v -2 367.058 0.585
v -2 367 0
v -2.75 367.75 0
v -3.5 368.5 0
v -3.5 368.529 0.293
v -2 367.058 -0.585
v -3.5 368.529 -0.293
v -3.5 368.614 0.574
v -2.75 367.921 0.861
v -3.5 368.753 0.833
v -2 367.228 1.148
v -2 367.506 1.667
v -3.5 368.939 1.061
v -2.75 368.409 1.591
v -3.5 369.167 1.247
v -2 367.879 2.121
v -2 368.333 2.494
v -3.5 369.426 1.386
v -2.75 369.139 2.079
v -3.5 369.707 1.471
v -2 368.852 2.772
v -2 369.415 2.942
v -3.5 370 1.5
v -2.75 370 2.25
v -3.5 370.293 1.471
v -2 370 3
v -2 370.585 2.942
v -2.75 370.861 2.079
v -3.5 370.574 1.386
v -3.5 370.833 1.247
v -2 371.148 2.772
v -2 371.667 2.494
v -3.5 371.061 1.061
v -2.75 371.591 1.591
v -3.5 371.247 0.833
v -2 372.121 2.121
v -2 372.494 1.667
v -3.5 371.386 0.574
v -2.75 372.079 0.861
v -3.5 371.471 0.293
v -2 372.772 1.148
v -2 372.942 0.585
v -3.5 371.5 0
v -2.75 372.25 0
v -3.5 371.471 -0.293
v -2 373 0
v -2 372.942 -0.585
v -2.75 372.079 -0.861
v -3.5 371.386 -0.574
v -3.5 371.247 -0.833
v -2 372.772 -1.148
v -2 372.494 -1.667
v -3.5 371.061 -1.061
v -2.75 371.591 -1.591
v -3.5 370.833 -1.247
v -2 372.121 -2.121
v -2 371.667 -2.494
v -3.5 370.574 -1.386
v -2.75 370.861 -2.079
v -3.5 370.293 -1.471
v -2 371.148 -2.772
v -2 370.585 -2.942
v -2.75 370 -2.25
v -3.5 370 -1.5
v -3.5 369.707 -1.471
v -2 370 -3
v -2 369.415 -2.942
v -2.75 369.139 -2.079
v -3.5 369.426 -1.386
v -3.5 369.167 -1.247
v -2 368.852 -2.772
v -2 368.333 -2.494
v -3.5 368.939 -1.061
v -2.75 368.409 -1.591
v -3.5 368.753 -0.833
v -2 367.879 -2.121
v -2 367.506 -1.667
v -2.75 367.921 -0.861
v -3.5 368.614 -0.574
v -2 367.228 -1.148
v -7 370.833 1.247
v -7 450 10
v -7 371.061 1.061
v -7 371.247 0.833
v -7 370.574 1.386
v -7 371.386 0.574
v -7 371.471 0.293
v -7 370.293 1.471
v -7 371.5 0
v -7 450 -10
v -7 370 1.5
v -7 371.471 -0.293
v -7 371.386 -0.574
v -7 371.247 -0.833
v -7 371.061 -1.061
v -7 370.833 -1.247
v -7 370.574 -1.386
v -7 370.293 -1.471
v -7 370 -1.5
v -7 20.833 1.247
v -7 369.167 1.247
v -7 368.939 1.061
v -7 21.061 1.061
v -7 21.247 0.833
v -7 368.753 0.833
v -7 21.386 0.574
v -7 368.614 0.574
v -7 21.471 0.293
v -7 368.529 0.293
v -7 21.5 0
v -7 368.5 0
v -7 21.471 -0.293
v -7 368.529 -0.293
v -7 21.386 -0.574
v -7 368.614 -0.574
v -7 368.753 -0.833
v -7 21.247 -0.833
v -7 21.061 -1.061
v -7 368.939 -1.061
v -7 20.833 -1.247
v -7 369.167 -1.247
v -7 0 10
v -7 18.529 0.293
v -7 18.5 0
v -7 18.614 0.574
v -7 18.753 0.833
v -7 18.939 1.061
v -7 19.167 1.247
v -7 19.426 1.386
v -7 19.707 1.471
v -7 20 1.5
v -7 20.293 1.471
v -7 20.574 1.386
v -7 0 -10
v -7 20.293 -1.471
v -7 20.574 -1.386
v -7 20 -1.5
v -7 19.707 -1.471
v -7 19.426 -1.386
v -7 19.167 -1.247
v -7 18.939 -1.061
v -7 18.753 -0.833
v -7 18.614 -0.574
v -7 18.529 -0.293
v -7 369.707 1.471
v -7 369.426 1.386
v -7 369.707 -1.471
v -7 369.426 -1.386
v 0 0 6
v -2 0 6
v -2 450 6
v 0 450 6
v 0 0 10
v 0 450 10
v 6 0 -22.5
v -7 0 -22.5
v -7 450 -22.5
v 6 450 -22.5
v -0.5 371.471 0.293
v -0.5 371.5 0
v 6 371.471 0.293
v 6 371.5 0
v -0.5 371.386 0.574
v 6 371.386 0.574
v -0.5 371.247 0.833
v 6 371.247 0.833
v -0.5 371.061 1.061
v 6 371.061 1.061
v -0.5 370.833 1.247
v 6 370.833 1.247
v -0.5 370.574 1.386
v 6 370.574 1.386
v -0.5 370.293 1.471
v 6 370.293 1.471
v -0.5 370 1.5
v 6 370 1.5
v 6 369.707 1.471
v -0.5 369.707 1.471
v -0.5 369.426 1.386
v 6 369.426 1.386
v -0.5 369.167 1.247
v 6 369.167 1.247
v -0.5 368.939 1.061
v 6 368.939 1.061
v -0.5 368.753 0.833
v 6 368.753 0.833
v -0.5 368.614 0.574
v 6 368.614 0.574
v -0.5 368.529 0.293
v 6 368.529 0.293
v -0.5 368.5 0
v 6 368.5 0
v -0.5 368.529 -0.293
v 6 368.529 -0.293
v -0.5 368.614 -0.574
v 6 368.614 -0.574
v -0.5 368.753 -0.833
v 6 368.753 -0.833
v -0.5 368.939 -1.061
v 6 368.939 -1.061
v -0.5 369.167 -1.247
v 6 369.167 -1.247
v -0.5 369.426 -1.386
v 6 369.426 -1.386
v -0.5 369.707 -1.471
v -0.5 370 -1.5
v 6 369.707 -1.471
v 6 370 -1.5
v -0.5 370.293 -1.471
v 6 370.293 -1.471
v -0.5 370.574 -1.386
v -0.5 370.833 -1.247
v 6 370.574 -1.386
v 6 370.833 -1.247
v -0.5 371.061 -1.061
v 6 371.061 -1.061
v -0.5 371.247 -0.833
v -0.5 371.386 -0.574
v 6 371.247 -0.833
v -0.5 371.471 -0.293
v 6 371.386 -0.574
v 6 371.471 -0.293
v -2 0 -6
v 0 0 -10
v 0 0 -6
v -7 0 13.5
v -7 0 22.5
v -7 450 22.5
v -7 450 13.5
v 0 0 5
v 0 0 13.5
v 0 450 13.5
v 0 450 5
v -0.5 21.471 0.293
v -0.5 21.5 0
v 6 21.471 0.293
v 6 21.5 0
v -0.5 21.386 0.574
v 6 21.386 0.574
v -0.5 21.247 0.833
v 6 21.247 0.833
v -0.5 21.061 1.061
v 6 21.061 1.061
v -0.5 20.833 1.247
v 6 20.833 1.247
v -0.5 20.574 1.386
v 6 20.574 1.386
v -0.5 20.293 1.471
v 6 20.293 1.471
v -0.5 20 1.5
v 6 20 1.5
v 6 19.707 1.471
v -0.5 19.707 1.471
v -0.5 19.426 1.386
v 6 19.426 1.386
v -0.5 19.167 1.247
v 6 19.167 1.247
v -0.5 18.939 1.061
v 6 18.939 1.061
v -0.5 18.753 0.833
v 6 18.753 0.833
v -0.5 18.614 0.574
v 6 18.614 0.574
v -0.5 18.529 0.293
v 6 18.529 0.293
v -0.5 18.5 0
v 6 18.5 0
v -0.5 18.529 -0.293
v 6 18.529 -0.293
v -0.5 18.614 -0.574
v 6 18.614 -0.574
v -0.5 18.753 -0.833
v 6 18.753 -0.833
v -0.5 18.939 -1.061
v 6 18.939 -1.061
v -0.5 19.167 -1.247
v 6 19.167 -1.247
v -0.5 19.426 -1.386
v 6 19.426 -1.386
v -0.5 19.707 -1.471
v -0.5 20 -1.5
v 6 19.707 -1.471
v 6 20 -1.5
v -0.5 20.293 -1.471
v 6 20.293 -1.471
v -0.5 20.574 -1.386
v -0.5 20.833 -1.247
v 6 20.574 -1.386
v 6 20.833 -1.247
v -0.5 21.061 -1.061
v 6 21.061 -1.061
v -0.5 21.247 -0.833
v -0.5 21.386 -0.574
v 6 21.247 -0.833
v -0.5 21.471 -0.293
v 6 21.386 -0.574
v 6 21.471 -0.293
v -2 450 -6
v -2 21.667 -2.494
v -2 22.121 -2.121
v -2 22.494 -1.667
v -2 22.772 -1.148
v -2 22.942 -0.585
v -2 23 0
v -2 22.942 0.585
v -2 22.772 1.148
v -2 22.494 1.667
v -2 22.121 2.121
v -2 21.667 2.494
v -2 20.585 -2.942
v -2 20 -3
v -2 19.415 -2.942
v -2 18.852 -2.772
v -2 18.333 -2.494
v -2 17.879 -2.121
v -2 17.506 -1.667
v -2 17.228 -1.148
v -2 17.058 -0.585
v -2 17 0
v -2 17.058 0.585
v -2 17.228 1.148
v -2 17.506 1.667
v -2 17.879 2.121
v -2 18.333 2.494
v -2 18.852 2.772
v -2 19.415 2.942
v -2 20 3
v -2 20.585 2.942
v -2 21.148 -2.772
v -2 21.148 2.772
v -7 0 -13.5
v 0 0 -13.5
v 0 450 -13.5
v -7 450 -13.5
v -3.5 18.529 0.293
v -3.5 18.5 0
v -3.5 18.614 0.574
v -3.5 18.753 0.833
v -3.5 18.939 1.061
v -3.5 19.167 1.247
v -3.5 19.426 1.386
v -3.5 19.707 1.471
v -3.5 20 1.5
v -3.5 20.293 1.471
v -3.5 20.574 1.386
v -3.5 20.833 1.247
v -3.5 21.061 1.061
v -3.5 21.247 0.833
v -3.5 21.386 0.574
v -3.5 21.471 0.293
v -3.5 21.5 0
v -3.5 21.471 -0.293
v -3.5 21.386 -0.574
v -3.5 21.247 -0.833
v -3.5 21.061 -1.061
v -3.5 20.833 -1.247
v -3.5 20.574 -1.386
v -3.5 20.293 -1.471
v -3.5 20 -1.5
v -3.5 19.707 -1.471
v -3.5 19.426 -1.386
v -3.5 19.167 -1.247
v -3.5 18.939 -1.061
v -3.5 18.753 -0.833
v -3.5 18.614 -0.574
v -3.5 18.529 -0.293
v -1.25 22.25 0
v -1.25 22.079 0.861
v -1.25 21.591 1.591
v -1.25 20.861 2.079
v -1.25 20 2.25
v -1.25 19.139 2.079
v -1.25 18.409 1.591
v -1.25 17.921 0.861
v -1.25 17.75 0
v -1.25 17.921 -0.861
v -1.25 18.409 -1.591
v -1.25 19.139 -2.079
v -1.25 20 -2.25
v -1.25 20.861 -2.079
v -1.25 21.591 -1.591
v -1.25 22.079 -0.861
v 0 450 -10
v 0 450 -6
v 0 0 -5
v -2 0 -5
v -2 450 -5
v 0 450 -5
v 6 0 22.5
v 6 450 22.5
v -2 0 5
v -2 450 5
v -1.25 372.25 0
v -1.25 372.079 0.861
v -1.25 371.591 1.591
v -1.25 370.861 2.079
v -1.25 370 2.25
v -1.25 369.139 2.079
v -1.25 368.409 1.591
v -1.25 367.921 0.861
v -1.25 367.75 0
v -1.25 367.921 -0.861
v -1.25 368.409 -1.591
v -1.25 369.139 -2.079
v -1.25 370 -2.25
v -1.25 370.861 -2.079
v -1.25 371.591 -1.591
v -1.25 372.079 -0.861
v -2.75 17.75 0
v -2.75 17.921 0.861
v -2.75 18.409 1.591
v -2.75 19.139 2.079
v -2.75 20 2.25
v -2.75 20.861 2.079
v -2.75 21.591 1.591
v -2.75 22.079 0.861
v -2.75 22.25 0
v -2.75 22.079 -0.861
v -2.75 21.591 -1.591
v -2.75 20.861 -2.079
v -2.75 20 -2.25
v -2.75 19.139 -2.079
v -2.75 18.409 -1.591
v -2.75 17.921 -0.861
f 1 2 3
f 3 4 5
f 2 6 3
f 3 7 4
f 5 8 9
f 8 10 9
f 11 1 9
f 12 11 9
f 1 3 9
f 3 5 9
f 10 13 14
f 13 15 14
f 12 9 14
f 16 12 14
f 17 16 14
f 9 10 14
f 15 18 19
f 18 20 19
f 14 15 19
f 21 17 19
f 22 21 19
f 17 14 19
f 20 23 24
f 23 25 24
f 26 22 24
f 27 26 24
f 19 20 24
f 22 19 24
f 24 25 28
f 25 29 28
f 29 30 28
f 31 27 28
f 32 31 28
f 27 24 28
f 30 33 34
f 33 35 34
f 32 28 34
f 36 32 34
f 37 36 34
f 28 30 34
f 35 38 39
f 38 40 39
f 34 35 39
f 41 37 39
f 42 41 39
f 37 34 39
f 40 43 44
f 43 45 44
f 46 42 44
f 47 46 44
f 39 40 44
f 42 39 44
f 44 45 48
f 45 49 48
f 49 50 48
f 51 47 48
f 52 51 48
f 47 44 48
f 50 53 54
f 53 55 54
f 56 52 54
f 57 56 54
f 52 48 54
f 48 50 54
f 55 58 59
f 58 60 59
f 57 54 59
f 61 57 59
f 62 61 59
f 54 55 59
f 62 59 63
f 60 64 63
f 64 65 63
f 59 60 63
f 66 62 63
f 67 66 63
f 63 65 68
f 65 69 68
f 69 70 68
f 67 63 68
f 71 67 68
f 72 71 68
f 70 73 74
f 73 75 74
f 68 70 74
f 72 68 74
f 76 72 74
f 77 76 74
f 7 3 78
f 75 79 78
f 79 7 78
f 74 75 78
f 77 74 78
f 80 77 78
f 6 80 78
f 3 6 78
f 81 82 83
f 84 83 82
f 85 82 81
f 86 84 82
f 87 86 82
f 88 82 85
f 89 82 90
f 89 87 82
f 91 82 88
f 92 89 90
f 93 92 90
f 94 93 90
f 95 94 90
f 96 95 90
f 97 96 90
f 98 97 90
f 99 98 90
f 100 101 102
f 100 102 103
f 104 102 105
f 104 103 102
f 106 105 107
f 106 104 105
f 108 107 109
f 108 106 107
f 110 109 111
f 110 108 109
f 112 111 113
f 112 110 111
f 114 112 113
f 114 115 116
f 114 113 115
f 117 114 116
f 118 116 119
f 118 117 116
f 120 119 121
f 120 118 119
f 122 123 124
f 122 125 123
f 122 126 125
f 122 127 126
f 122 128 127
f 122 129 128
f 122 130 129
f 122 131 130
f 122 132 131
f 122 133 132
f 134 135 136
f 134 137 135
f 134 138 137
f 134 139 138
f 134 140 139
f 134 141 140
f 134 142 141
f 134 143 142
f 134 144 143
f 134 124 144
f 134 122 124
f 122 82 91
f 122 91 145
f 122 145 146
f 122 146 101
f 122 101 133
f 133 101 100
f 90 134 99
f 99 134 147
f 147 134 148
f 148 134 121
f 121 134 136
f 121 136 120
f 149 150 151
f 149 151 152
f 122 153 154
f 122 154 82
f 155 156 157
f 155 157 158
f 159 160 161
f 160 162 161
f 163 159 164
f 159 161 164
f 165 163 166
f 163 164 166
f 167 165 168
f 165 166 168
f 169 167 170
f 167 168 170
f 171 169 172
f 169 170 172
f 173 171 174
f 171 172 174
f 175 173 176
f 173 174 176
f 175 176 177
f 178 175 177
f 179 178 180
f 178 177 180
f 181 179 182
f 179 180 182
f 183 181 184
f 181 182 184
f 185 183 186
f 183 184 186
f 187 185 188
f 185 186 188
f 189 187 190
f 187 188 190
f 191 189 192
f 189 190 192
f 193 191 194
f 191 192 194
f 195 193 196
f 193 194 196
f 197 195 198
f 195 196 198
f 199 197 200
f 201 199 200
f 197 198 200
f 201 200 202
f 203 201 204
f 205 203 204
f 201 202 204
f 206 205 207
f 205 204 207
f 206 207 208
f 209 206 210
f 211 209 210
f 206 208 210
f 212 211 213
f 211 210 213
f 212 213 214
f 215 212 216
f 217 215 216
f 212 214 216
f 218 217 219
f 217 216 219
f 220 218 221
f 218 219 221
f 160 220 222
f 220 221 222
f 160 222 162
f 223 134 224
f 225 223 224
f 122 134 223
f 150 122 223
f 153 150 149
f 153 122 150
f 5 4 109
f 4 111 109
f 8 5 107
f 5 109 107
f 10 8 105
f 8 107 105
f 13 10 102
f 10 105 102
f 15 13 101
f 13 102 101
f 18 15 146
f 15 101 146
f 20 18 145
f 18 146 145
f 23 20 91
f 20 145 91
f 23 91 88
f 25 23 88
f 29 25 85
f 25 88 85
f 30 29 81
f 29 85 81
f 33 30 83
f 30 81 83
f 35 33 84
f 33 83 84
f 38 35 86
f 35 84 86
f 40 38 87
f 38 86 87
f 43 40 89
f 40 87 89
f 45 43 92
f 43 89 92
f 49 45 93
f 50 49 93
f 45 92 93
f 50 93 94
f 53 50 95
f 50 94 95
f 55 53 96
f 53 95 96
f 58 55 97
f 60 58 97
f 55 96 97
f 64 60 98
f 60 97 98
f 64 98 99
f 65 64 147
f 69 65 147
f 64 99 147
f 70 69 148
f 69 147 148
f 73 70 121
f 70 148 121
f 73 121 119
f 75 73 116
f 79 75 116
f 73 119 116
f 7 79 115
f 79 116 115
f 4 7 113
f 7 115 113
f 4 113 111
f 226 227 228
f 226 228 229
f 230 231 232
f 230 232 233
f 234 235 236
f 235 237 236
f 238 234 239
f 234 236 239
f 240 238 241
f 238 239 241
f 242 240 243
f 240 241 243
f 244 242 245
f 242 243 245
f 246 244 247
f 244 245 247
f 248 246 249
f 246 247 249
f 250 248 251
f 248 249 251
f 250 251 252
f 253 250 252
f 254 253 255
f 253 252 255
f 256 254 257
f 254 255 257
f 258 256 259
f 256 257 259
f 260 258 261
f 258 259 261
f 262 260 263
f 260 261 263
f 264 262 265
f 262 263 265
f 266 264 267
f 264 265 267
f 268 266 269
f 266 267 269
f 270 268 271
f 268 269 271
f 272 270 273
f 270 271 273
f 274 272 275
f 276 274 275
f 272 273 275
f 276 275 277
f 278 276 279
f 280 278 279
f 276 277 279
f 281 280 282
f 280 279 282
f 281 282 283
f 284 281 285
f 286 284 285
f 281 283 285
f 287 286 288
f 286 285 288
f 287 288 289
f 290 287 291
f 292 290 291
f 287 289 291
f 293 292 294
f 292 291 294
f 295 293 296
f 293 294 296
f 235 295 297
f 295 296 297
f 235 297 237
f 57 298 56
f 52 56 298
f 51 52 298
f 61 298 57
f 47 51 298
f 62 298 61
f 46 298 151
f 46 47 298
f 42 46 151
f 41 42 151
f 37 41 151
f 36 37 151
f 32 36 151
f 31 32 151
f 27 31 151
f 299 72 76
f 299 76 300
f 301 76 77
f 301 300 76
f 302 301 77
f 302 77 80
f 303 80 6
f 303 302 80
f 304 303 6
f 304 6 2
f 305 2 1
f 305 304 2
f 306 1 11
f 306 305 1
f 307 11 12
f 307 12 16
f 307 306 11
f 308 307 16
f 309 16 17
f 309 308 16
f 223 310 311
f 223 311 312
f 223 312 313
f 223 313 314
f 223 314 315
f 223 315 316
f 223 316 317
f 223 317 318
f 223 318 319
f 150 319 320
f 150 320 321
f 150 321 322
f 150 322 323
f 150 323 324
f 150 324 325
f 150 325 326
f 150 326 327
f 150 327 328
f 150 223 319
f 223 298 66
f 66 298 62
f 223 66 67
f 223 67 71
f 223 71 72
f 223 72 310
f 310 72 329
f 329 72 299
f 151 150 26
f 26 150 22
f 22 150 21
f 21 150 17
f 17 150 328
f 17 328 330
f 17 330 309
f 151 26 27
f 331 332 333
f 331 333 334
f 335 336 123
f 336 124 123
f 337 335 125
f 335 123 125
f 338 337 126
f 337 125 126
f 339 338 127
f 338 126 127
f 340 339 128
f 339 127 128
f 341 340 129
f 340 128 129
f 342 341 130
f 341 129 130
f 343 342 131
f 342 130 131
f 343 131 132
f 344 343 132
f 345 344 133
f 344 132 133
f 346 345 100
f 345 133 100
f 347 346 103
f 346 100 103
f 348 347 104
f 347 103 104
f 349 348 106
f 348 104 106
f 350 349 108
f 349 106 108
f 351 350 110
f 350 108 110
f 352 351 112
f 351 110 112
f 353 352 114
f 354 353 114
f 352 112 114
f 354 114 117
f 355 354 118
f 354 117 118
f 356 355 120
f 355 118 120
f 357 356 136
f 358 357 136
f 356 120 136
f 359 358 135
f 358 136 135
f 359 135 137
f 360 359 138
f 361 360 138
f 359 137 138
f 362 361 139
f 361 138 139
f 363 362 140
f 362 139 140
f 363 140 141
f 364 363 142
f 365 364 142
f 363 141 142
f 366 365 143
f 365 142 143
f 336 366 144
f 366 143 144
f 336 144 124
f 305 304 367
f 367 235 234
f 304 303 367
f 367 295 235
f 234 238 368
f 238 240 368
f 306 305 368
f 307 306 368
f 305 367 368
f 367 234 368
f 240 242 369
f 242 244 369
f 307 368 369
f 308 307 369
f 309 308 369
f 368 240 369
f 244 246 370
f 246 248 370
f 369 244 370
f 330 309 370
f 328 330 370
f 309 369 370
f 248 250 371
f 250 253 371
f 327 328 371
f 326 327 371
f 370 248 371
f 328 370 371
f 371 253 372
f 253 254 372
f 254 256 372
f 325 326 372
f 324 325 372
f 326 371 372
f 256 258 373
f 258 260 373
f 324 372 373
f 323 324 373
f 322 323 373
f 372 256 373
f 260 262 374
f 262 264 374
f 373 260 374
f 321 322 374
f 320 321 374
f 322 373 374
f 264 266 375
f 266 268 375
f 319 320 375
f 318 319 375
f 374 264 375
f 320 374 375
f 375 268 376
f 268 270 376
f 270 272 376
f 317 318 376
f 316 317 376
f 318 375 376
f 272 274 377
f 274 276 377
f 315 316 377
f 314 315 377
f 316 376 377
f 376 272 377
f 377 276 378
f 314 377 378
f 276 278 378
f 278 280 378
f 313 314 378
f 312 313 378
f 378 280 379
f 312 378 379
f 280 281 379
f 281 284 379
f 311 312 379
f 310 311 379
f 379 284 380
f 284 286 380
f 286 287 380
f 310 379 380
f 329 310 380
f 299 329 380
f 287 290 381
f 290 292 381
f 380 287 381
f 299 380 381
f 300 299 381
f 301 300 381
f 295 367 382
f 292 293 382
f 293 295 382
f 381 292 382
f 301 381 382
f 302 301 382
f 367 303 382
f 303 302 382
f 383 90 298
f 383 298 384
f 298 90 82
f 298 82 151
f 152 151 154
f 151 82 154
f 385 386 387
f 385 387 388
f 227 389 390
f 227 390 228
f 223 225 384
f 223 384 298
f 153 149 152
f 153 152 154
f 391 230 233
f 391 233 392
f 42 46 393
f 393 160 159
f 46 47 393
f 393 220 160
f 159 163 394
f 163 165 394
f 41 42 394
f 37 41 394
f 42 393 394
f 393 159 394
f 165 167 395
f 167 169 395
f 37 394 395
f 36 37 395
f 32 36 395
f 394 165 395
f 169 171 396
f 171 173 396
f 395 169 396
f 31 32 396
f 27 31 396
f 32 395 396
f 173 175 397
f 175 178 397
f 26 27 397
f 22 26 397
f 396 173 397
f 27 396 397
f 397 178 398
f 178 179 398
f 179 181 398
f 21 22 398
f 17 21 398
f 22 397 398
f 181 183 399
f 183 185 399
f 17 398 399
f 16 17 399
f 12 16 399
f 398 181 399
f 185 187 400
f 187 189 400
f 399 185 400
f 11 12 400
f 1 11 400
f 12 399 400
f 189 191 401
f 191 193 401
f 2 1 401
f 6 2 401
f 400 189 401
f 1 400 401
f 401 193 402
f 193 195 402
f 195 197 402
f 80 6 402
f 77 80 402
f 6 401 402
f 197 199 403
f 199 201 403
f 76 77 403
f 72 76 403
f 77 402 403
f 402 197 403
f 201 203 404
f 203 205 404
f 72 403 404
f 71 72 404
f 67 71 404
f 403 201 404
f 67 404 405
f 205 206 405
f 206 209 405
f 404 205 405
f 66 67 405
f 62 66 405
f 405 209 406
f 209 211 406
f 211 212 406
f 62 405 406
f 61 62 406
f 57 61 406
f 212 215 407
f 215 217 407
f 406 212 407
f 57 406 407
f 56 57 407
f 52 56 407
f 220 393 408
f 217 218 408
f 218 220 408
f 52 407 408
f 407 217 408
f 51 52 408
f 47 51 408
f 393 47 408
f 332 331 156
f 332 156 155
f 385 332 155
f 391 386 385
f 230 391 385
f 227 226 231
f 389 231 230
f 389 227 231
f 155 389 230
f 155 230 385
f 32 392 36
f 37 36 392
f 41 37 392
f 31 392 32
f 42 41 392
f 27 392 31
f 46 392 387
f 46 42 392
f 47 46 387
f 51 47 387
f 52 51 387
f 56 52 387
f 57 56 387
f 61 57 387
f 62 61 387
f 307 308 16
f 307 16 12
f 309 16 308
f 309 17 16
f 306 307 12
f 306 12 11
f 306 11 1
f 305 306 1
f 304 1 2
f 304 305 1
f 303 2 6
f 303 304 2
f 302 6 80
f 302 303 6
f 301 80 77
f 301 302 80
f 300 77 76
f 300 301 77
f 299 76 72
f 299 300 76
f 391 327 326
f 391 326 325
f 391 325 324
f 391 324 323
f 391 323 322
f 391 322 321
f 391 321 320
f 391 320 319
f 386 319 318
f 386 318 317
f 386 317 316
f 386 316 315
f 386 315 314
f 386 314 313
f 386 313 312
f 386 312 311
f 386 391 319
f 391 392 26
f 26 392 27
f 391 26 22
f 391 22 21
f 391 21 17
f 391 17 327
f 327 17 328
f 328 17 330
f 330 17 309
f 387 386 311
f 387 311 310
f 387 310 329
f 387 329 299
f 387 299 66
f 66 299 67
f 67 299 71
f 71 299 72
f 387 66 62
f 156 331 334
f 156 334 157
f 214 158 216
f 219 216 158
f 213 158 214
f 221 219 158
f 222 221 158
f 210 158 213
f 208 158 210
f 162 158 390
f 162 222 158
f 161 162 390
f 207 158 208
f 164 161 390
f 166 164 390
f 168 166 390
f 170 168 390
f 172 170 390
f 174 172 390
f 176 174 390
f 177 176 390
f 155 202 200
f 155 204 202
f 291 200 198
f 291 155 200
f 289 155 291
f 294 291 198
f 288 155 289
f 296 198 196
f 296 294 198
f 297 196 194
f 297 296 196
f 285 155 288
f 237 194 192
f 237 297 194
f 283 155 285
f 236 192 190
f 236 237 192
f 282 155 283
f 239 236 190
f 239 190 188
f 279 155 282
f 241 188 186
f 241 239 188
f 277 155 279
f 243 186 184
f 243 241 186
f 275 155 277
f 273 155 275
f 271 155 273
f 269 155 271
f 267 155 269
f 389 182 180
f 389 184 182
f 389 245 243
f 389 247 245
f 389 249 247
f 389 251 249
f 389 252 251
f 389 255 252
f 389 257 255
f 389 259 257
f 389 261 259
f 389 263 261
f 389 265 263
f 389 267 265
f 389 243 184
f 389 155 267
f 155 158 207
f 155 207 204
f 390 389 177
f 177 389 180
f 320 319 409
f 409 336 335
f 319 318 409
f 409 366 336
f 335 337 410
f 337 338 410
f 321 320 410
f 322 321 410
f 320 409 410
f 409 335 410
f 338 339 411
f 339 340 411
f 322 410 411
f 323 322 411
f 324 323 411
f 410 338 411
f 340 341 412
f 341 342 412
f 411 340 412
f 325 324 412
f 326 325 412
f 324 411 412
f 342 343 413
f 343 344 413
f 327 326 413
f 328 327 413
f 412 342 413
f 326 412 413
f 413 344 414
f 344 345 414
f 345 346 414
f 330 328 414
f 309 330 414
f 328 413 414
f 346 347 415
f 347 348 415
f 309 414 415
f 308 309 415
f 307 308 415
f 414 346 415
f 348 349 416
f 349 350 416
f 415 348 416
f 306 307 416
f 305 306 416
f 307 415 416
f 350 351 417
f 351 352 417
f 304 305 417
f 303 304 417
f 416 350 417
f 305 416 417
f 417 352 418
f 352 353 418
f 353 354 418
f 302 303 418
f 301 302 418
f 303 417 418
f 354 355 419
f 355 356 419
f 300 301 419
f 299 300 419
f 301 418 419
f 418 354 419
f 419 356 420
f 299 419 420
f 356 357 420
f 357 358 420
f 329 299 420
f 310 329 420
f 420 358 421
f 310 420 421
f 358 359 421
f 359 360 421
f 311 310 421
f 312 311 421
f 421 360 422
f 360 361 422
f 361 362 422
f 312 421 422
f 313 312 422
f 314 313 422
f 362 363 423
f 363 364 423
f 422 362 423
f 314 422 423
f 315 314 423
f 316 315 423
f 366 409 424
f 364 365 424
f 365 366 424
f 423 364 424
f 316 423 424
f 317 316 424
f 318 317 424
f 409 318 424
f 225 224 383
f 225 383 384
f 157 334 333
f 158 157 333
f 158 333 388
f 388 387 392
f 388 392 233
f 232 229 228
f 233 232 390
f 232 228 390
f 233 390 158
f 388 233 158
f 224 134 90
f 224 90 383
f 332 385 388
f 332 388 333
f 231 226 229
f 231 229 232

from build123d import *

# Parameters (mm, degrees)
F1_DEPTH       = 450
F3_D           = 3
F3_CSINK_D     = 6
F3_CSINK_ANGLE = 90
F5_DEPTH       = 450
F7_D           = 3
F7_CSINK_D     = 6
F7_CSINK_ANGLE = 90


with BuildPart() as f1:
    # F0 (on Front) → F1 (new body)
    with BuildSketch(Plane.XZ):
        Polygon((0, 10), (-7, 10), (-7, -10), (0, -10), (0, -6), (-2, -6), (-2, 6), (0, 6), align=None)
    extrude(amount=-F1_DEPTH)

    # F3 (through all)
    with Locations(Plane.YZ.offset(-2)):
        with Locations((20, 0), (370, 0)):
            CounterSinkHole(F3_D / 2, F3_CSINK_D / 2, counter_sink_angle=F3_CSINK_ANGLE)


with BuildPart() as f5:
    # F4 (on Front) → F5 (new body)
    with BuildSketch(Plane.XZ):
        Polygon((6, 22.5), (-7, 22.5), (-7, 13.5), (0, 13.5), (0, 5), (-2, 5), (-2, -5), (0, -5), (0, -13.5), (-7, -13.5), (-7, -22.5), (6, -22.5), align=None)
    extrude(amount=-F5_DEPTH)

    # F7 (through all)
    with Locations(Plane(origin=(-2, 0, 0), x_dir=(0, -1, 0), z_dir=(-1, 0, 0))):
        with Locations((-20, 0), (-370, 0)):
            CounterSinkHole(F7_D / 2, F7_CSINK_D / 2, counter_sink_angle=F7_CSINK_ANGLE)


solid = Compound([f1.part, f5.part])
